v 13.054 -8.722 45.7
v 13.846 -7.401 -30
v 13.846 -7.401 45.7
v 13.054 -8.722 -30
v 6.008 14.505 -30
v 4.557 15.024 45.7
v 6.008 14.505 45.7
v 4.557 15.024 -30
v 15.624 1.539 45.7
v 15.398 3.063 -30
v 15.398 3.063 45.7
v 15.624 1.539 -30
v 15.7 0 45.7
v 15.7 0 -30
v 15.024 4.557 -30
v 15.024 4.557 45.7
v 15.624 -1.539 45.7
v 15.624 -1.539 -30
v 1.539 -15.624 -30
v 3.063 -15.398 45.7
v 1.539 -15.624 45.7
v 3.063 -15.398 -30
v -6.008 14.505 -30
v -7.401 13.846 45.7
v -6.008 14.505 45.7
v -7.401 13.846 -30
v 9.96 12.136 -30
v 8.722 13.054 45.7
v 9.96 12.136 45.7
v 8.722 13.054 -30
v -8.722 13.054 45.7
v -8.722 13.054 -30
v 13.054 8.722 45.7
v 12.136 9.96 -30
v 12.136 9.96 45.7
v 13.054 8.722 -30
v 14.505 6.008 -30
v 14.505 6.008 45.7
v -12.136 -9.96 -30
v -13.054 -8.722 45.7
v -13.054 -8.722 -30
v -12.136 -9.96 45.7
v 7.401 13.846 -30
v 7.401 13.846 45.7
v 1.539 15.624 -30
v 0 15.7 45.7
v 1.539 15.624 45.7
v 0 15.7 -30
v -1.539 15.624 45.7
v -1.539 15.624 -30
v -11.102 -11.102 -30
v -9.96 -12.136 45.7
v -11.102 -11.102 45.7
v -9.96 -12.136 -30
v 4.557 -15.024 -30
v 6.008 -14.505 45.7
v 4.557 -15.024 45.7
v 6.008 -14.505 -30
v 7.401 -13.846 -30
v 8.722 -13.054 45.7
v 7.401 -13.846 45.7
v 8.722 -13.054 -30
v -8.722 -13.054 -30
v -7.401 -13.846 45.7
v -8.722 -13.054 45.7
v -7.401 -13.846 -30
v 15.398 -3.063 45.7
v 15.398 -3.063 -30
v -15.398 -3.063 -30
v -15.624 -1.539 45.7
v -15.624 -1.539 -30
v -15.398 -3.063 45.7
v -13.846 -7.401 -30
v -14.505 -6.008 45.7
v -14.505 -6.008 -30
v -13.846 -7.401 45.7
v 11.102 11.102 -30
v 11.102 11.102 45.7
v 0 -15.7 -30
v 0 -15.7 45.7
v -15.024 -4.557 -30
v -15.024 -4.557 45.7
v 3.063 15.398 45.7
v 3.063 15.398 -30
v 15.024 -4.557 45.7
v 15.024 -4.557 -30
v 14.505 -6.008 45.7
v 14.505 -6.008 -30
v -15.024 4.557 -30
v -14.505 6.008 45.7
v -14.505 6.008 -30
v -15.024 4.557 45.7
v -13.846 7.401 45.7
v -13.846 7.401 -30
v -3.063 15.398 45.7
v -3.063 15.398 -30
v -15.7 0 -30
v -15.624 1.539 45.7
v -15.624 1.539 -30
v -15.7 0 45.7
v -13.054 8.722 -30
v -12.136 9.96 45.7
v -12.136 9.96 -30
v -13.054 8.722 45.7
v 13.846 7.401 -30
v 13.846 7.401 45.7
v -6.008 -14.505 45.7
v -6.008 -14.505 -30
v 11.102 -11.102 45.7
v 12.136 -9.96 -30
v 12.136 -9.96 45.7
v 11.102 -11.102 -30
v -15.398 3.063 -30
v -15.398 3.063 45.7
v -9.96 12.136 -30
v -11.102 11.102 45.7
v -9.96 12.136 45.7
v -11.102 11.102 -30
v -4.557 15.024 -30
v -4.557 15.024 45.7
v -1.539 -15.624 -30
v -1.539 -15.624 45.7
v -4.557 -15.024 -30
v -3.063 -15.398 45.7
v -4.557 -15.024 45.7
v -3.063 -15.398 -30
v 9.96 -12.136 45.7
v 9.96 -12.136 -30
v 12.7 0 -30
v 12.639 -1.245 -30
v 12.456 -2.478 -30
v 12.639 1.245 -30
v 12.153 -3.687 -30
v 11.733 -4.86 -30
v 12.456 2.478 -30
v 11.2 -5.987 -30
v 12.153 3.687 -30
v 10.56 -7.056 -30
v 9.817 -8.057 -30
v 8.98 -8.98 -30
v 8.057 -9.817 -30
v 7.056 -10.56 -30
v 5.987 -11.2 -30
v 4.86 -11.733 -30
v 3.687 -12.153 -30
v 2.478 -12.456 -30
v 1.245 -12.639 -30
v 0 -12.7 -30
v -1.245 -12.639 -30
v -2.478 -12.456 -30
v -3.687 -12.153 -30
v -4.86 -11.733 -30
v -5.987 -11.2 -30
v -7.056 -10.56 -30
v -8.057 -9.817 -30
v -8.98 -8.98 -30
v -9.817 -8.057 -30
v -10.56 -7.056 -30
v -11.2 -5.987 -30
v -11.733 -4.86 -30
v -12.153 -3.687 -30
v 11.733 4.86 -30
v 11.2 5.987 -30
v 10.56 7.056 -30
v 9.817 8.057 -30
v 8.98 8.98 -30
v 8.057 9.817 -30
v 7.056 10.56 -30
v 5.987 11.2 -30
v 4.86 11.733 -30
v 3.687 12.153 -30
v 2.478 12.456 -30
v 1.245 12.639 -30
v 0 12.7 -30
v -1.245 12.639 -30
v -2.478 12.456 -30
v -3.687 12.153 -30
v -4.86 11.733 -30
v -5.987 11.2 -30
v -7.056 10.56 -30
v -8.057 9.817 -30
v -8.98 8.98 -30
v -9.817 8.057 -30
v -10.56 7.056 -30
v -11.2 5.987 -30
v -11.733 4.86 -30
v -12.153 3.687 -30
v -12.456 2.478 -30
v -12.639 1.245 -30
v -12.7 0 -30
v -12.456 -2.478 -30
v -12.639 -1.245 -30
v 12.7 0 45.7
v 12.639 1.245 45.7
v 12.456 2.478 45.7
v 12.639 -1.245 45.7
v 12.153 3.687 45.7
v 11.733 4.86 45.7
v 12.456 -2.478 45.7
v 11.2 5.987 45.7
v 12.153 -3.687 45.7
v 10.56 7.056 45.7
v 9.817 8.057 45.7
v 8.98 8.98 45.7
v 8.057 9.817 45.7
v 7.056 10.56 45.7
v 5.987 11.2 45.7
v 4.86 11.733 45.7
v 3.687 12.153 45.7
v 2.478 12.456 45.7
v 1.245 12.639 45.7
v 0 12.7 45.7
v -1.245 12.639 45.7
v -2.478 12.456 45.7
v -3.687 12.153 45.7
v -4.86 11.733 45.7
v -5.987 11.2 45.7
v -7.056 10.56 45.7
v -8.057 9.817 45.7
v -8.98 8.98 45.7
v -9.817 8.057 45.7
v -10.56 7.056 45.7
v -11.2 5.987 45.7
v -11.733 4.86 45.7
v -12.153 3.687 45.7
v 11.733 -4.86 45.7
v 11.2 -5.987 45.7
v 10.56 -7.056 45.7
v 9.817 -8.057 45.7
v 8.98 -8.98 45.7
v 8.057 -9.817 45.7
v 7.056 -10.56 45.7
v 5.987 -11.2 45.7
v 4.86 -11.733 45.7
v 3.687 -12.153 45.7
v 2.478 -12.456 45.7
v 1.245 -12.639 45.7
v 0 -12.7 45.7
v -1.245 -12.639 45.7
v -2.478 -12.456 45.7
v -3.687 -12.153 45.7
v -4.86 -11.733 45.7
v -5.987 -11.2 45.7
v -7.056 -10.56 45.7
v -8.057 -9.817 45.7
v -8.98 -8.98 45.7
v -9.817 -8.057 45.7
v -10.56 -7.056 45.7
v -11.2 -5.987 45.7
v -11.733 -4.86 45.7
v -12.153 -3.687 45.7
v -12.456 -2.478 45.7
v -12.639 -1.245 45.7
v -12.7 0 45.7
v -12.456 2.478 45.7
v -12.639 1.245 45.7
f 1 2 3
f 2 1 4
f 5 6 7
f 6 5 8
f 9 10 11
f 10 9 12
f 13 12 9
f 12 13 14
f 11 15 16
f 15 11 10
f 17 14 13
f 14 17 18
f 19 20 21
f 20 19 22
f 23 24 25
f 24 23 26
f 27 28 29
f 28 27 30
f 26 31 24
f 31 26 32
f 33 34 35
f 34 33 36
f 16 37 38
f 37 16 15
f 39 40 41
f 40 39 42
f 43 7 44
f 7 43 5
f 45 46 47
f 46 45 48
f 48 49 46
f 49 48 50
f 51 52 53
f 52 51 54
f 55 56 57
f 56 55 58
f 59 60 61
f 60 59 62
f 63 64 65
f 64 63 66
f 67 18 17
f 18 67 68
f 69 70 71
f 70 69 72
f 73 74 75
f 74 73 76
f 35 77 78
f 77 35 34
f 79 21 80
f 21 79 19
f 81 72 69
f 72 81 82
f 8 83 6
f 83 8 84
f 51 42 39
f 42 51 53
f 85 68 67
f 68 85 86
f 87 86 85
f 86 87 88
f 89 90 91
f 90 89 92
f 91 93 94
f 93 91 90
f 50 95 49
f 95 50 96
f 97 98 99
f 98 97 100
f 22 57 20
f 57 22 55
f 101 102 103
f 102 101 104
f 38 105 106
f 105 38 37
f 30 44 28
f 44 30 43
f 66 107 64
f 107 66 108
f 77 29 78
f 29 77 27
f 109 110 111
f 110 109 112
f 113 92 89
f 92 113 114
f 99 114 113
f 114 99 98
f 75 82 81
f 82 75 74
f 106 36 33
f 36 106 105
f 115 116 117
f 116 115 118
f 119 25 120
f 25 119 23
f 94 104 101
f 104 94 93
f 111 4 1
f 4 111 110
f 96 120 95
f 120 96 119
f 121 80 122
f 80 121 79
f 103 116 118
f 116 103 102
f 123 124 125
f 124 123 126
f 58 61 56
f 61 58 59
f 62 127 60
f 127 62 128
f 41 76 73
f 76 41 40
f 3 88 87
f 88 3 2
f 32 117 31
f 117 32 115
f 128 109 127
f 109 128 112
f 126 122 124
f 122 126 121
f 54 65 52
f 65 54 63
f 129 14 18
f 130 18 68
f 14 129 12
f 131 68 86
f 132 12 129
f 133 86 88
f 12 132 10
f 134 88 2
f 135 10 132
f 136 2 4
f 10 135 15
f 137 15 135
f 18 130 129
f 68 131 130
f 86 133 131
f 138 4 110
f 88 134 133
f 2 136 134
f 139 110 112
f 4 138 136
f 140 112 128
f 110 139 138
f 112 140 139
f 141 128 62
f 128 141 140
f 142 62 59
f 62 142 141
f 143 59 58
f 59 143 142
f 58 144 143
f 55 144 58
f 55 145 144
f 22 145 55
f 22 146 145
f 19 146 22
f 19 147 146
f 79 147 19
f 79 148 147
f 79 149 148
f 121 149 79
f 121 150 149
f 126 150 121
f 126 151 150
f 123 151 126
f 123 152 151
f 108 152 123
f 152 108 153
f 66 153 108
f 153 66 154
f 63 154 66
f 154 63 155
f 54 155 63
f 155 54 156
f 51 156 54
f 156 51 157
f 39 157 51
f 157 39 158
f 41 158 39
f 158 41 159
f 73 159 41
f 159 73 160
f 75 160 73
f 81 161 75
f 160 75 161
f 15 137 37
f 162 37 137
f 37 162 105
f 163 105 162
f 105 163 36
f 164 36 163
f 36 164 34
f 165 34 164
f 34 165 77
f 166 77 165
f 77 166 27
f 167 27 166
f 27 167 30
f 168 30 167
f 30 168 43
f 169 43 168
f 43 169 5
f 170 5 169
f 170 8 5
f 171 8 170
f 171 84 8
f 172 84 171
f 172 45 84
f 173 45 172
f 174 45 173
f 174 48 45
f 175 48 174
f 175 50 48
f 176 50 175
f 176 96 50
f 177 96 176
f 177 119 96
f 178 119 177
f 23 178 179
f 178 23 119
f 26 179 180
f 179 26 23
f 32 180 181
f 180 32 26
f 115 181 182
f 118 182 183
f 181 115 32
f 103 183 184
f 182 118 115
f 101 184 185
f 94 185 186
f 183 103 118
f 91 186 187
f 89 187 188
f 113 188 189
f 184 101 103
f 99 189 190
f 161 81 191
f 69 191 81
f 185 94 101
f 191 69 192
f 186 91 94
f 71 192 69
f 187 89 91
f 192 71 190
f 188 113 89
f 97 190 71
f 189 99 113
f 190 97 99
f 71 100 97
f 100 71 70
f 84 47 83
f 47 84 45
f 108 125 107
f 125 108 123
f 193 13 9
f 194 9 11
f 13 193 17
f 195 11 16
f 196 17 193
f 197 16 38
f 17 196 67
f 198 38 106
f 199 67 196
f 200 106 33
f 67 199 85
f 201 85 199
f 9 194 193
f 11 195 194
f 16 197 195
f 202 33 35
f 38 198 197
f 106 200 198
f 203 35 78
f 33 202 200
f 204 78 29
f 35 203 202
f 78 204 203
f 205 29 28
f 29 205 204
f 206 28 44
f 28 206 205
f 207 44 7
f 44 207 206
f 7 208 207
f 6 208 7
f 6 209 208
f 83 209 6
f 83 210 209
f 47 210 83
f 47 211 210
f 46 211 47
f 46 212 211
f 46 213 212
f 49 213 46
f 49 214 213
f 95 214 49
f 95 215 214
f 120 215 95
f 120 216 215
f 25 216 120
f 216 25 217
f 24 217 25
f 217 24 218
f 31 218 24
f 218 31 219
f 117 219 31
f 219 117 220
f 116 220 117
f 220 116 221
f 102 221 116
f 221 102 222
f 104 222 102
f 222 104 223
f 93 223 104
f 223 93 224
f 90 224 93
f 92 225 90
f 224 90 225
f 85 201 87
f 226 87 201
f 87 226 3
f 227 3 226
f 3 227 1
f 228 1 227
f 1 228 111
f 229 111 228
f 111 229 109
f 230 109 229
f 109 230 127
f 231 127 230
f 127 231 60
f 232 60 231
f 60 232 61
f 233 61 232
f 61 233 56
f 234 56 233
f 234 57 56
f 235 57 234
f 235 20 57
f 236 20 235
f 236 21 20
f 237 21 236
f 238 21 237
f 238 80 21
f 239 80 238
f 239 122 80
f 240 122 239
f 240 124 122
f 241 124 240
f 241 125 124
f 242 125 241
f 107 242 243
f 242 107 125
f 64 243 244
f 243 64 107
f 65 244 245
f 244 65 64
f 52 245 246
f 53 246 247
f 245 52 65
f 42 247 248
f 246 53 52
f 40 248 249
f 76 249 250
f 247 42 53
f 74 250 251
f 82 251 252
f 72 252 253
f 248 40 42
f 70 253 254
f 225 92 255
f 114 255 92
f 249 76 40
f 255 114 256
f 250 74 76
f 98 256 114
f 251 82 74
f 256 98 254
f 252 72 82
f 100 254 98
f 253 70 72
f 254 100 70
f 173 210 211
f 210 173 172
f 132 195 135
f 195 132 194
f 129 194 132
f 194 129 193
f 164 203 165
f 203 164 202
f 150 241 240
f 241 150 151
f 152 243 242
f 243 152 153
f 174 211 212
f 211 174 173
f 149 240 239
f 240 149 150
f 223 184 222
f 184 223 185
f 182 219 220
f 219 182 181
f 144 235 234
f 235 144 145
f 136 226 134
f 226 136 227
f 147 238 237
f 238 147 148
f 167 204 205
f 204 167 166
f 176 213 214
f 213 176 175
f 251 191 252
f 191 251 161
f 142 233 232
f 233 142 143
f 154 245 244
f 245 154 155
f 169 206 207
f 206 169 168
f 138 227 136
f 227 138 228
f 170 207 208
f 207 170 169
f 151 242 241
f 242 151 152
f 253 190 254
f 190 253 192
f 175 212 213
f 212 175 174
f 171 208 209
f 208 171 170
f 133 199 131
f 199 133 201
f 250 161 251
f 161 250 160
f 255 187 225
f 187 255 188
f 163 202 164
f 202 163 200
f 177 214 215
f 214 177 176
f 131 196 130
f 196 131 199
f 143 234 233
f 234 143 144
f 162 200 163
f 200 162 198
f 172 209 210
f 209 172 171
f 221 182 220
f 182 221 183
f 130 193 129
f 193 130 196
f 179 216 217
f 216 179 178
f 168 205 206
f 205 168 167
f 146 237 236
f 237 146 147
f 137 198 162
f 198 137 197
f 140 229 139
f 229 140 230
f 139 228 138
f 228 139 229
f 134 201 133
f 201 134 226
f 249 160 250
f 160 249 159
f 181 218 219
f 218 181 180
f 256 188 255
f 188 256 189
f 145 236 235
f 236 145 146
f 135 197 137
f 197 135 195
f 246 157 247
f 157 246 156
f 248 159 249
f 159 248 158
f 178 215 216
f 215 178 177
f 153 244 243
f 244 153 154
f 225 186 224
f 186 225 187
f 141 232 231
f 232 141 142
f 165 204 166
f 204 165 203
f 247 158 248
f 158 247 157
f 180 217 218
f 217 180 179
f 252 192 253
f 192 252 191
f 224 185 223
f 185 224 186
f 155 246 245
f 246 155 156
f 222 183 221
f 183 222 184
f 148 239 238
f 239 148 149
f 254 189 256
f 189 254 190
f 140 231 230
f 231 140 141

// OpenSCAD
// Parametric Pipe Tee (T-junction)
// Parameters are injected via OpenSCAD -D flags

// Pipe inner diameter (mm)
pipe_id = 25.4;
// Wall thickness (mm)
wall_thickness = 3;
// Branch angle from main pipe (degrees, 90 = standard tee)
branch_angle = 90;
// Main pipe total length (mm)
main_length = 60;
// Branch pipe length from center (mm)
branch_length = 30;
// Resolution
$fn = 64;

pipe_od = pipe_id + 2 * wall_thickness;

module tee() {
    difference() {
        union() {
            // Main pipe (along Z axis, centered)
            cylinder(h = main_length, d = pipe_od, center = true);

            // Branch pipe (rotated by branch_angle from main axis)
            rotate([0, -(90 - branch_angle), 0])
                translate([0, 0, 0])
                    cylinder(h = branch_length + pipe_od/2, d = pipe_od);
        }

        // Hollow out main pipe
        translate([0, 0, -main_length/2 - 0.1])
            cylinder(h = main_length + 0.2, d = pipe_id);

        // Hollow out branch pipe (extended through intersection)
        rotate([0, -(90 - branch_angle), 0])
            translate([0, 0, -pipe_od/2])
                cylinder(h = branch_length + pipe_od, d = pipe_id);
    }
}

tee();
